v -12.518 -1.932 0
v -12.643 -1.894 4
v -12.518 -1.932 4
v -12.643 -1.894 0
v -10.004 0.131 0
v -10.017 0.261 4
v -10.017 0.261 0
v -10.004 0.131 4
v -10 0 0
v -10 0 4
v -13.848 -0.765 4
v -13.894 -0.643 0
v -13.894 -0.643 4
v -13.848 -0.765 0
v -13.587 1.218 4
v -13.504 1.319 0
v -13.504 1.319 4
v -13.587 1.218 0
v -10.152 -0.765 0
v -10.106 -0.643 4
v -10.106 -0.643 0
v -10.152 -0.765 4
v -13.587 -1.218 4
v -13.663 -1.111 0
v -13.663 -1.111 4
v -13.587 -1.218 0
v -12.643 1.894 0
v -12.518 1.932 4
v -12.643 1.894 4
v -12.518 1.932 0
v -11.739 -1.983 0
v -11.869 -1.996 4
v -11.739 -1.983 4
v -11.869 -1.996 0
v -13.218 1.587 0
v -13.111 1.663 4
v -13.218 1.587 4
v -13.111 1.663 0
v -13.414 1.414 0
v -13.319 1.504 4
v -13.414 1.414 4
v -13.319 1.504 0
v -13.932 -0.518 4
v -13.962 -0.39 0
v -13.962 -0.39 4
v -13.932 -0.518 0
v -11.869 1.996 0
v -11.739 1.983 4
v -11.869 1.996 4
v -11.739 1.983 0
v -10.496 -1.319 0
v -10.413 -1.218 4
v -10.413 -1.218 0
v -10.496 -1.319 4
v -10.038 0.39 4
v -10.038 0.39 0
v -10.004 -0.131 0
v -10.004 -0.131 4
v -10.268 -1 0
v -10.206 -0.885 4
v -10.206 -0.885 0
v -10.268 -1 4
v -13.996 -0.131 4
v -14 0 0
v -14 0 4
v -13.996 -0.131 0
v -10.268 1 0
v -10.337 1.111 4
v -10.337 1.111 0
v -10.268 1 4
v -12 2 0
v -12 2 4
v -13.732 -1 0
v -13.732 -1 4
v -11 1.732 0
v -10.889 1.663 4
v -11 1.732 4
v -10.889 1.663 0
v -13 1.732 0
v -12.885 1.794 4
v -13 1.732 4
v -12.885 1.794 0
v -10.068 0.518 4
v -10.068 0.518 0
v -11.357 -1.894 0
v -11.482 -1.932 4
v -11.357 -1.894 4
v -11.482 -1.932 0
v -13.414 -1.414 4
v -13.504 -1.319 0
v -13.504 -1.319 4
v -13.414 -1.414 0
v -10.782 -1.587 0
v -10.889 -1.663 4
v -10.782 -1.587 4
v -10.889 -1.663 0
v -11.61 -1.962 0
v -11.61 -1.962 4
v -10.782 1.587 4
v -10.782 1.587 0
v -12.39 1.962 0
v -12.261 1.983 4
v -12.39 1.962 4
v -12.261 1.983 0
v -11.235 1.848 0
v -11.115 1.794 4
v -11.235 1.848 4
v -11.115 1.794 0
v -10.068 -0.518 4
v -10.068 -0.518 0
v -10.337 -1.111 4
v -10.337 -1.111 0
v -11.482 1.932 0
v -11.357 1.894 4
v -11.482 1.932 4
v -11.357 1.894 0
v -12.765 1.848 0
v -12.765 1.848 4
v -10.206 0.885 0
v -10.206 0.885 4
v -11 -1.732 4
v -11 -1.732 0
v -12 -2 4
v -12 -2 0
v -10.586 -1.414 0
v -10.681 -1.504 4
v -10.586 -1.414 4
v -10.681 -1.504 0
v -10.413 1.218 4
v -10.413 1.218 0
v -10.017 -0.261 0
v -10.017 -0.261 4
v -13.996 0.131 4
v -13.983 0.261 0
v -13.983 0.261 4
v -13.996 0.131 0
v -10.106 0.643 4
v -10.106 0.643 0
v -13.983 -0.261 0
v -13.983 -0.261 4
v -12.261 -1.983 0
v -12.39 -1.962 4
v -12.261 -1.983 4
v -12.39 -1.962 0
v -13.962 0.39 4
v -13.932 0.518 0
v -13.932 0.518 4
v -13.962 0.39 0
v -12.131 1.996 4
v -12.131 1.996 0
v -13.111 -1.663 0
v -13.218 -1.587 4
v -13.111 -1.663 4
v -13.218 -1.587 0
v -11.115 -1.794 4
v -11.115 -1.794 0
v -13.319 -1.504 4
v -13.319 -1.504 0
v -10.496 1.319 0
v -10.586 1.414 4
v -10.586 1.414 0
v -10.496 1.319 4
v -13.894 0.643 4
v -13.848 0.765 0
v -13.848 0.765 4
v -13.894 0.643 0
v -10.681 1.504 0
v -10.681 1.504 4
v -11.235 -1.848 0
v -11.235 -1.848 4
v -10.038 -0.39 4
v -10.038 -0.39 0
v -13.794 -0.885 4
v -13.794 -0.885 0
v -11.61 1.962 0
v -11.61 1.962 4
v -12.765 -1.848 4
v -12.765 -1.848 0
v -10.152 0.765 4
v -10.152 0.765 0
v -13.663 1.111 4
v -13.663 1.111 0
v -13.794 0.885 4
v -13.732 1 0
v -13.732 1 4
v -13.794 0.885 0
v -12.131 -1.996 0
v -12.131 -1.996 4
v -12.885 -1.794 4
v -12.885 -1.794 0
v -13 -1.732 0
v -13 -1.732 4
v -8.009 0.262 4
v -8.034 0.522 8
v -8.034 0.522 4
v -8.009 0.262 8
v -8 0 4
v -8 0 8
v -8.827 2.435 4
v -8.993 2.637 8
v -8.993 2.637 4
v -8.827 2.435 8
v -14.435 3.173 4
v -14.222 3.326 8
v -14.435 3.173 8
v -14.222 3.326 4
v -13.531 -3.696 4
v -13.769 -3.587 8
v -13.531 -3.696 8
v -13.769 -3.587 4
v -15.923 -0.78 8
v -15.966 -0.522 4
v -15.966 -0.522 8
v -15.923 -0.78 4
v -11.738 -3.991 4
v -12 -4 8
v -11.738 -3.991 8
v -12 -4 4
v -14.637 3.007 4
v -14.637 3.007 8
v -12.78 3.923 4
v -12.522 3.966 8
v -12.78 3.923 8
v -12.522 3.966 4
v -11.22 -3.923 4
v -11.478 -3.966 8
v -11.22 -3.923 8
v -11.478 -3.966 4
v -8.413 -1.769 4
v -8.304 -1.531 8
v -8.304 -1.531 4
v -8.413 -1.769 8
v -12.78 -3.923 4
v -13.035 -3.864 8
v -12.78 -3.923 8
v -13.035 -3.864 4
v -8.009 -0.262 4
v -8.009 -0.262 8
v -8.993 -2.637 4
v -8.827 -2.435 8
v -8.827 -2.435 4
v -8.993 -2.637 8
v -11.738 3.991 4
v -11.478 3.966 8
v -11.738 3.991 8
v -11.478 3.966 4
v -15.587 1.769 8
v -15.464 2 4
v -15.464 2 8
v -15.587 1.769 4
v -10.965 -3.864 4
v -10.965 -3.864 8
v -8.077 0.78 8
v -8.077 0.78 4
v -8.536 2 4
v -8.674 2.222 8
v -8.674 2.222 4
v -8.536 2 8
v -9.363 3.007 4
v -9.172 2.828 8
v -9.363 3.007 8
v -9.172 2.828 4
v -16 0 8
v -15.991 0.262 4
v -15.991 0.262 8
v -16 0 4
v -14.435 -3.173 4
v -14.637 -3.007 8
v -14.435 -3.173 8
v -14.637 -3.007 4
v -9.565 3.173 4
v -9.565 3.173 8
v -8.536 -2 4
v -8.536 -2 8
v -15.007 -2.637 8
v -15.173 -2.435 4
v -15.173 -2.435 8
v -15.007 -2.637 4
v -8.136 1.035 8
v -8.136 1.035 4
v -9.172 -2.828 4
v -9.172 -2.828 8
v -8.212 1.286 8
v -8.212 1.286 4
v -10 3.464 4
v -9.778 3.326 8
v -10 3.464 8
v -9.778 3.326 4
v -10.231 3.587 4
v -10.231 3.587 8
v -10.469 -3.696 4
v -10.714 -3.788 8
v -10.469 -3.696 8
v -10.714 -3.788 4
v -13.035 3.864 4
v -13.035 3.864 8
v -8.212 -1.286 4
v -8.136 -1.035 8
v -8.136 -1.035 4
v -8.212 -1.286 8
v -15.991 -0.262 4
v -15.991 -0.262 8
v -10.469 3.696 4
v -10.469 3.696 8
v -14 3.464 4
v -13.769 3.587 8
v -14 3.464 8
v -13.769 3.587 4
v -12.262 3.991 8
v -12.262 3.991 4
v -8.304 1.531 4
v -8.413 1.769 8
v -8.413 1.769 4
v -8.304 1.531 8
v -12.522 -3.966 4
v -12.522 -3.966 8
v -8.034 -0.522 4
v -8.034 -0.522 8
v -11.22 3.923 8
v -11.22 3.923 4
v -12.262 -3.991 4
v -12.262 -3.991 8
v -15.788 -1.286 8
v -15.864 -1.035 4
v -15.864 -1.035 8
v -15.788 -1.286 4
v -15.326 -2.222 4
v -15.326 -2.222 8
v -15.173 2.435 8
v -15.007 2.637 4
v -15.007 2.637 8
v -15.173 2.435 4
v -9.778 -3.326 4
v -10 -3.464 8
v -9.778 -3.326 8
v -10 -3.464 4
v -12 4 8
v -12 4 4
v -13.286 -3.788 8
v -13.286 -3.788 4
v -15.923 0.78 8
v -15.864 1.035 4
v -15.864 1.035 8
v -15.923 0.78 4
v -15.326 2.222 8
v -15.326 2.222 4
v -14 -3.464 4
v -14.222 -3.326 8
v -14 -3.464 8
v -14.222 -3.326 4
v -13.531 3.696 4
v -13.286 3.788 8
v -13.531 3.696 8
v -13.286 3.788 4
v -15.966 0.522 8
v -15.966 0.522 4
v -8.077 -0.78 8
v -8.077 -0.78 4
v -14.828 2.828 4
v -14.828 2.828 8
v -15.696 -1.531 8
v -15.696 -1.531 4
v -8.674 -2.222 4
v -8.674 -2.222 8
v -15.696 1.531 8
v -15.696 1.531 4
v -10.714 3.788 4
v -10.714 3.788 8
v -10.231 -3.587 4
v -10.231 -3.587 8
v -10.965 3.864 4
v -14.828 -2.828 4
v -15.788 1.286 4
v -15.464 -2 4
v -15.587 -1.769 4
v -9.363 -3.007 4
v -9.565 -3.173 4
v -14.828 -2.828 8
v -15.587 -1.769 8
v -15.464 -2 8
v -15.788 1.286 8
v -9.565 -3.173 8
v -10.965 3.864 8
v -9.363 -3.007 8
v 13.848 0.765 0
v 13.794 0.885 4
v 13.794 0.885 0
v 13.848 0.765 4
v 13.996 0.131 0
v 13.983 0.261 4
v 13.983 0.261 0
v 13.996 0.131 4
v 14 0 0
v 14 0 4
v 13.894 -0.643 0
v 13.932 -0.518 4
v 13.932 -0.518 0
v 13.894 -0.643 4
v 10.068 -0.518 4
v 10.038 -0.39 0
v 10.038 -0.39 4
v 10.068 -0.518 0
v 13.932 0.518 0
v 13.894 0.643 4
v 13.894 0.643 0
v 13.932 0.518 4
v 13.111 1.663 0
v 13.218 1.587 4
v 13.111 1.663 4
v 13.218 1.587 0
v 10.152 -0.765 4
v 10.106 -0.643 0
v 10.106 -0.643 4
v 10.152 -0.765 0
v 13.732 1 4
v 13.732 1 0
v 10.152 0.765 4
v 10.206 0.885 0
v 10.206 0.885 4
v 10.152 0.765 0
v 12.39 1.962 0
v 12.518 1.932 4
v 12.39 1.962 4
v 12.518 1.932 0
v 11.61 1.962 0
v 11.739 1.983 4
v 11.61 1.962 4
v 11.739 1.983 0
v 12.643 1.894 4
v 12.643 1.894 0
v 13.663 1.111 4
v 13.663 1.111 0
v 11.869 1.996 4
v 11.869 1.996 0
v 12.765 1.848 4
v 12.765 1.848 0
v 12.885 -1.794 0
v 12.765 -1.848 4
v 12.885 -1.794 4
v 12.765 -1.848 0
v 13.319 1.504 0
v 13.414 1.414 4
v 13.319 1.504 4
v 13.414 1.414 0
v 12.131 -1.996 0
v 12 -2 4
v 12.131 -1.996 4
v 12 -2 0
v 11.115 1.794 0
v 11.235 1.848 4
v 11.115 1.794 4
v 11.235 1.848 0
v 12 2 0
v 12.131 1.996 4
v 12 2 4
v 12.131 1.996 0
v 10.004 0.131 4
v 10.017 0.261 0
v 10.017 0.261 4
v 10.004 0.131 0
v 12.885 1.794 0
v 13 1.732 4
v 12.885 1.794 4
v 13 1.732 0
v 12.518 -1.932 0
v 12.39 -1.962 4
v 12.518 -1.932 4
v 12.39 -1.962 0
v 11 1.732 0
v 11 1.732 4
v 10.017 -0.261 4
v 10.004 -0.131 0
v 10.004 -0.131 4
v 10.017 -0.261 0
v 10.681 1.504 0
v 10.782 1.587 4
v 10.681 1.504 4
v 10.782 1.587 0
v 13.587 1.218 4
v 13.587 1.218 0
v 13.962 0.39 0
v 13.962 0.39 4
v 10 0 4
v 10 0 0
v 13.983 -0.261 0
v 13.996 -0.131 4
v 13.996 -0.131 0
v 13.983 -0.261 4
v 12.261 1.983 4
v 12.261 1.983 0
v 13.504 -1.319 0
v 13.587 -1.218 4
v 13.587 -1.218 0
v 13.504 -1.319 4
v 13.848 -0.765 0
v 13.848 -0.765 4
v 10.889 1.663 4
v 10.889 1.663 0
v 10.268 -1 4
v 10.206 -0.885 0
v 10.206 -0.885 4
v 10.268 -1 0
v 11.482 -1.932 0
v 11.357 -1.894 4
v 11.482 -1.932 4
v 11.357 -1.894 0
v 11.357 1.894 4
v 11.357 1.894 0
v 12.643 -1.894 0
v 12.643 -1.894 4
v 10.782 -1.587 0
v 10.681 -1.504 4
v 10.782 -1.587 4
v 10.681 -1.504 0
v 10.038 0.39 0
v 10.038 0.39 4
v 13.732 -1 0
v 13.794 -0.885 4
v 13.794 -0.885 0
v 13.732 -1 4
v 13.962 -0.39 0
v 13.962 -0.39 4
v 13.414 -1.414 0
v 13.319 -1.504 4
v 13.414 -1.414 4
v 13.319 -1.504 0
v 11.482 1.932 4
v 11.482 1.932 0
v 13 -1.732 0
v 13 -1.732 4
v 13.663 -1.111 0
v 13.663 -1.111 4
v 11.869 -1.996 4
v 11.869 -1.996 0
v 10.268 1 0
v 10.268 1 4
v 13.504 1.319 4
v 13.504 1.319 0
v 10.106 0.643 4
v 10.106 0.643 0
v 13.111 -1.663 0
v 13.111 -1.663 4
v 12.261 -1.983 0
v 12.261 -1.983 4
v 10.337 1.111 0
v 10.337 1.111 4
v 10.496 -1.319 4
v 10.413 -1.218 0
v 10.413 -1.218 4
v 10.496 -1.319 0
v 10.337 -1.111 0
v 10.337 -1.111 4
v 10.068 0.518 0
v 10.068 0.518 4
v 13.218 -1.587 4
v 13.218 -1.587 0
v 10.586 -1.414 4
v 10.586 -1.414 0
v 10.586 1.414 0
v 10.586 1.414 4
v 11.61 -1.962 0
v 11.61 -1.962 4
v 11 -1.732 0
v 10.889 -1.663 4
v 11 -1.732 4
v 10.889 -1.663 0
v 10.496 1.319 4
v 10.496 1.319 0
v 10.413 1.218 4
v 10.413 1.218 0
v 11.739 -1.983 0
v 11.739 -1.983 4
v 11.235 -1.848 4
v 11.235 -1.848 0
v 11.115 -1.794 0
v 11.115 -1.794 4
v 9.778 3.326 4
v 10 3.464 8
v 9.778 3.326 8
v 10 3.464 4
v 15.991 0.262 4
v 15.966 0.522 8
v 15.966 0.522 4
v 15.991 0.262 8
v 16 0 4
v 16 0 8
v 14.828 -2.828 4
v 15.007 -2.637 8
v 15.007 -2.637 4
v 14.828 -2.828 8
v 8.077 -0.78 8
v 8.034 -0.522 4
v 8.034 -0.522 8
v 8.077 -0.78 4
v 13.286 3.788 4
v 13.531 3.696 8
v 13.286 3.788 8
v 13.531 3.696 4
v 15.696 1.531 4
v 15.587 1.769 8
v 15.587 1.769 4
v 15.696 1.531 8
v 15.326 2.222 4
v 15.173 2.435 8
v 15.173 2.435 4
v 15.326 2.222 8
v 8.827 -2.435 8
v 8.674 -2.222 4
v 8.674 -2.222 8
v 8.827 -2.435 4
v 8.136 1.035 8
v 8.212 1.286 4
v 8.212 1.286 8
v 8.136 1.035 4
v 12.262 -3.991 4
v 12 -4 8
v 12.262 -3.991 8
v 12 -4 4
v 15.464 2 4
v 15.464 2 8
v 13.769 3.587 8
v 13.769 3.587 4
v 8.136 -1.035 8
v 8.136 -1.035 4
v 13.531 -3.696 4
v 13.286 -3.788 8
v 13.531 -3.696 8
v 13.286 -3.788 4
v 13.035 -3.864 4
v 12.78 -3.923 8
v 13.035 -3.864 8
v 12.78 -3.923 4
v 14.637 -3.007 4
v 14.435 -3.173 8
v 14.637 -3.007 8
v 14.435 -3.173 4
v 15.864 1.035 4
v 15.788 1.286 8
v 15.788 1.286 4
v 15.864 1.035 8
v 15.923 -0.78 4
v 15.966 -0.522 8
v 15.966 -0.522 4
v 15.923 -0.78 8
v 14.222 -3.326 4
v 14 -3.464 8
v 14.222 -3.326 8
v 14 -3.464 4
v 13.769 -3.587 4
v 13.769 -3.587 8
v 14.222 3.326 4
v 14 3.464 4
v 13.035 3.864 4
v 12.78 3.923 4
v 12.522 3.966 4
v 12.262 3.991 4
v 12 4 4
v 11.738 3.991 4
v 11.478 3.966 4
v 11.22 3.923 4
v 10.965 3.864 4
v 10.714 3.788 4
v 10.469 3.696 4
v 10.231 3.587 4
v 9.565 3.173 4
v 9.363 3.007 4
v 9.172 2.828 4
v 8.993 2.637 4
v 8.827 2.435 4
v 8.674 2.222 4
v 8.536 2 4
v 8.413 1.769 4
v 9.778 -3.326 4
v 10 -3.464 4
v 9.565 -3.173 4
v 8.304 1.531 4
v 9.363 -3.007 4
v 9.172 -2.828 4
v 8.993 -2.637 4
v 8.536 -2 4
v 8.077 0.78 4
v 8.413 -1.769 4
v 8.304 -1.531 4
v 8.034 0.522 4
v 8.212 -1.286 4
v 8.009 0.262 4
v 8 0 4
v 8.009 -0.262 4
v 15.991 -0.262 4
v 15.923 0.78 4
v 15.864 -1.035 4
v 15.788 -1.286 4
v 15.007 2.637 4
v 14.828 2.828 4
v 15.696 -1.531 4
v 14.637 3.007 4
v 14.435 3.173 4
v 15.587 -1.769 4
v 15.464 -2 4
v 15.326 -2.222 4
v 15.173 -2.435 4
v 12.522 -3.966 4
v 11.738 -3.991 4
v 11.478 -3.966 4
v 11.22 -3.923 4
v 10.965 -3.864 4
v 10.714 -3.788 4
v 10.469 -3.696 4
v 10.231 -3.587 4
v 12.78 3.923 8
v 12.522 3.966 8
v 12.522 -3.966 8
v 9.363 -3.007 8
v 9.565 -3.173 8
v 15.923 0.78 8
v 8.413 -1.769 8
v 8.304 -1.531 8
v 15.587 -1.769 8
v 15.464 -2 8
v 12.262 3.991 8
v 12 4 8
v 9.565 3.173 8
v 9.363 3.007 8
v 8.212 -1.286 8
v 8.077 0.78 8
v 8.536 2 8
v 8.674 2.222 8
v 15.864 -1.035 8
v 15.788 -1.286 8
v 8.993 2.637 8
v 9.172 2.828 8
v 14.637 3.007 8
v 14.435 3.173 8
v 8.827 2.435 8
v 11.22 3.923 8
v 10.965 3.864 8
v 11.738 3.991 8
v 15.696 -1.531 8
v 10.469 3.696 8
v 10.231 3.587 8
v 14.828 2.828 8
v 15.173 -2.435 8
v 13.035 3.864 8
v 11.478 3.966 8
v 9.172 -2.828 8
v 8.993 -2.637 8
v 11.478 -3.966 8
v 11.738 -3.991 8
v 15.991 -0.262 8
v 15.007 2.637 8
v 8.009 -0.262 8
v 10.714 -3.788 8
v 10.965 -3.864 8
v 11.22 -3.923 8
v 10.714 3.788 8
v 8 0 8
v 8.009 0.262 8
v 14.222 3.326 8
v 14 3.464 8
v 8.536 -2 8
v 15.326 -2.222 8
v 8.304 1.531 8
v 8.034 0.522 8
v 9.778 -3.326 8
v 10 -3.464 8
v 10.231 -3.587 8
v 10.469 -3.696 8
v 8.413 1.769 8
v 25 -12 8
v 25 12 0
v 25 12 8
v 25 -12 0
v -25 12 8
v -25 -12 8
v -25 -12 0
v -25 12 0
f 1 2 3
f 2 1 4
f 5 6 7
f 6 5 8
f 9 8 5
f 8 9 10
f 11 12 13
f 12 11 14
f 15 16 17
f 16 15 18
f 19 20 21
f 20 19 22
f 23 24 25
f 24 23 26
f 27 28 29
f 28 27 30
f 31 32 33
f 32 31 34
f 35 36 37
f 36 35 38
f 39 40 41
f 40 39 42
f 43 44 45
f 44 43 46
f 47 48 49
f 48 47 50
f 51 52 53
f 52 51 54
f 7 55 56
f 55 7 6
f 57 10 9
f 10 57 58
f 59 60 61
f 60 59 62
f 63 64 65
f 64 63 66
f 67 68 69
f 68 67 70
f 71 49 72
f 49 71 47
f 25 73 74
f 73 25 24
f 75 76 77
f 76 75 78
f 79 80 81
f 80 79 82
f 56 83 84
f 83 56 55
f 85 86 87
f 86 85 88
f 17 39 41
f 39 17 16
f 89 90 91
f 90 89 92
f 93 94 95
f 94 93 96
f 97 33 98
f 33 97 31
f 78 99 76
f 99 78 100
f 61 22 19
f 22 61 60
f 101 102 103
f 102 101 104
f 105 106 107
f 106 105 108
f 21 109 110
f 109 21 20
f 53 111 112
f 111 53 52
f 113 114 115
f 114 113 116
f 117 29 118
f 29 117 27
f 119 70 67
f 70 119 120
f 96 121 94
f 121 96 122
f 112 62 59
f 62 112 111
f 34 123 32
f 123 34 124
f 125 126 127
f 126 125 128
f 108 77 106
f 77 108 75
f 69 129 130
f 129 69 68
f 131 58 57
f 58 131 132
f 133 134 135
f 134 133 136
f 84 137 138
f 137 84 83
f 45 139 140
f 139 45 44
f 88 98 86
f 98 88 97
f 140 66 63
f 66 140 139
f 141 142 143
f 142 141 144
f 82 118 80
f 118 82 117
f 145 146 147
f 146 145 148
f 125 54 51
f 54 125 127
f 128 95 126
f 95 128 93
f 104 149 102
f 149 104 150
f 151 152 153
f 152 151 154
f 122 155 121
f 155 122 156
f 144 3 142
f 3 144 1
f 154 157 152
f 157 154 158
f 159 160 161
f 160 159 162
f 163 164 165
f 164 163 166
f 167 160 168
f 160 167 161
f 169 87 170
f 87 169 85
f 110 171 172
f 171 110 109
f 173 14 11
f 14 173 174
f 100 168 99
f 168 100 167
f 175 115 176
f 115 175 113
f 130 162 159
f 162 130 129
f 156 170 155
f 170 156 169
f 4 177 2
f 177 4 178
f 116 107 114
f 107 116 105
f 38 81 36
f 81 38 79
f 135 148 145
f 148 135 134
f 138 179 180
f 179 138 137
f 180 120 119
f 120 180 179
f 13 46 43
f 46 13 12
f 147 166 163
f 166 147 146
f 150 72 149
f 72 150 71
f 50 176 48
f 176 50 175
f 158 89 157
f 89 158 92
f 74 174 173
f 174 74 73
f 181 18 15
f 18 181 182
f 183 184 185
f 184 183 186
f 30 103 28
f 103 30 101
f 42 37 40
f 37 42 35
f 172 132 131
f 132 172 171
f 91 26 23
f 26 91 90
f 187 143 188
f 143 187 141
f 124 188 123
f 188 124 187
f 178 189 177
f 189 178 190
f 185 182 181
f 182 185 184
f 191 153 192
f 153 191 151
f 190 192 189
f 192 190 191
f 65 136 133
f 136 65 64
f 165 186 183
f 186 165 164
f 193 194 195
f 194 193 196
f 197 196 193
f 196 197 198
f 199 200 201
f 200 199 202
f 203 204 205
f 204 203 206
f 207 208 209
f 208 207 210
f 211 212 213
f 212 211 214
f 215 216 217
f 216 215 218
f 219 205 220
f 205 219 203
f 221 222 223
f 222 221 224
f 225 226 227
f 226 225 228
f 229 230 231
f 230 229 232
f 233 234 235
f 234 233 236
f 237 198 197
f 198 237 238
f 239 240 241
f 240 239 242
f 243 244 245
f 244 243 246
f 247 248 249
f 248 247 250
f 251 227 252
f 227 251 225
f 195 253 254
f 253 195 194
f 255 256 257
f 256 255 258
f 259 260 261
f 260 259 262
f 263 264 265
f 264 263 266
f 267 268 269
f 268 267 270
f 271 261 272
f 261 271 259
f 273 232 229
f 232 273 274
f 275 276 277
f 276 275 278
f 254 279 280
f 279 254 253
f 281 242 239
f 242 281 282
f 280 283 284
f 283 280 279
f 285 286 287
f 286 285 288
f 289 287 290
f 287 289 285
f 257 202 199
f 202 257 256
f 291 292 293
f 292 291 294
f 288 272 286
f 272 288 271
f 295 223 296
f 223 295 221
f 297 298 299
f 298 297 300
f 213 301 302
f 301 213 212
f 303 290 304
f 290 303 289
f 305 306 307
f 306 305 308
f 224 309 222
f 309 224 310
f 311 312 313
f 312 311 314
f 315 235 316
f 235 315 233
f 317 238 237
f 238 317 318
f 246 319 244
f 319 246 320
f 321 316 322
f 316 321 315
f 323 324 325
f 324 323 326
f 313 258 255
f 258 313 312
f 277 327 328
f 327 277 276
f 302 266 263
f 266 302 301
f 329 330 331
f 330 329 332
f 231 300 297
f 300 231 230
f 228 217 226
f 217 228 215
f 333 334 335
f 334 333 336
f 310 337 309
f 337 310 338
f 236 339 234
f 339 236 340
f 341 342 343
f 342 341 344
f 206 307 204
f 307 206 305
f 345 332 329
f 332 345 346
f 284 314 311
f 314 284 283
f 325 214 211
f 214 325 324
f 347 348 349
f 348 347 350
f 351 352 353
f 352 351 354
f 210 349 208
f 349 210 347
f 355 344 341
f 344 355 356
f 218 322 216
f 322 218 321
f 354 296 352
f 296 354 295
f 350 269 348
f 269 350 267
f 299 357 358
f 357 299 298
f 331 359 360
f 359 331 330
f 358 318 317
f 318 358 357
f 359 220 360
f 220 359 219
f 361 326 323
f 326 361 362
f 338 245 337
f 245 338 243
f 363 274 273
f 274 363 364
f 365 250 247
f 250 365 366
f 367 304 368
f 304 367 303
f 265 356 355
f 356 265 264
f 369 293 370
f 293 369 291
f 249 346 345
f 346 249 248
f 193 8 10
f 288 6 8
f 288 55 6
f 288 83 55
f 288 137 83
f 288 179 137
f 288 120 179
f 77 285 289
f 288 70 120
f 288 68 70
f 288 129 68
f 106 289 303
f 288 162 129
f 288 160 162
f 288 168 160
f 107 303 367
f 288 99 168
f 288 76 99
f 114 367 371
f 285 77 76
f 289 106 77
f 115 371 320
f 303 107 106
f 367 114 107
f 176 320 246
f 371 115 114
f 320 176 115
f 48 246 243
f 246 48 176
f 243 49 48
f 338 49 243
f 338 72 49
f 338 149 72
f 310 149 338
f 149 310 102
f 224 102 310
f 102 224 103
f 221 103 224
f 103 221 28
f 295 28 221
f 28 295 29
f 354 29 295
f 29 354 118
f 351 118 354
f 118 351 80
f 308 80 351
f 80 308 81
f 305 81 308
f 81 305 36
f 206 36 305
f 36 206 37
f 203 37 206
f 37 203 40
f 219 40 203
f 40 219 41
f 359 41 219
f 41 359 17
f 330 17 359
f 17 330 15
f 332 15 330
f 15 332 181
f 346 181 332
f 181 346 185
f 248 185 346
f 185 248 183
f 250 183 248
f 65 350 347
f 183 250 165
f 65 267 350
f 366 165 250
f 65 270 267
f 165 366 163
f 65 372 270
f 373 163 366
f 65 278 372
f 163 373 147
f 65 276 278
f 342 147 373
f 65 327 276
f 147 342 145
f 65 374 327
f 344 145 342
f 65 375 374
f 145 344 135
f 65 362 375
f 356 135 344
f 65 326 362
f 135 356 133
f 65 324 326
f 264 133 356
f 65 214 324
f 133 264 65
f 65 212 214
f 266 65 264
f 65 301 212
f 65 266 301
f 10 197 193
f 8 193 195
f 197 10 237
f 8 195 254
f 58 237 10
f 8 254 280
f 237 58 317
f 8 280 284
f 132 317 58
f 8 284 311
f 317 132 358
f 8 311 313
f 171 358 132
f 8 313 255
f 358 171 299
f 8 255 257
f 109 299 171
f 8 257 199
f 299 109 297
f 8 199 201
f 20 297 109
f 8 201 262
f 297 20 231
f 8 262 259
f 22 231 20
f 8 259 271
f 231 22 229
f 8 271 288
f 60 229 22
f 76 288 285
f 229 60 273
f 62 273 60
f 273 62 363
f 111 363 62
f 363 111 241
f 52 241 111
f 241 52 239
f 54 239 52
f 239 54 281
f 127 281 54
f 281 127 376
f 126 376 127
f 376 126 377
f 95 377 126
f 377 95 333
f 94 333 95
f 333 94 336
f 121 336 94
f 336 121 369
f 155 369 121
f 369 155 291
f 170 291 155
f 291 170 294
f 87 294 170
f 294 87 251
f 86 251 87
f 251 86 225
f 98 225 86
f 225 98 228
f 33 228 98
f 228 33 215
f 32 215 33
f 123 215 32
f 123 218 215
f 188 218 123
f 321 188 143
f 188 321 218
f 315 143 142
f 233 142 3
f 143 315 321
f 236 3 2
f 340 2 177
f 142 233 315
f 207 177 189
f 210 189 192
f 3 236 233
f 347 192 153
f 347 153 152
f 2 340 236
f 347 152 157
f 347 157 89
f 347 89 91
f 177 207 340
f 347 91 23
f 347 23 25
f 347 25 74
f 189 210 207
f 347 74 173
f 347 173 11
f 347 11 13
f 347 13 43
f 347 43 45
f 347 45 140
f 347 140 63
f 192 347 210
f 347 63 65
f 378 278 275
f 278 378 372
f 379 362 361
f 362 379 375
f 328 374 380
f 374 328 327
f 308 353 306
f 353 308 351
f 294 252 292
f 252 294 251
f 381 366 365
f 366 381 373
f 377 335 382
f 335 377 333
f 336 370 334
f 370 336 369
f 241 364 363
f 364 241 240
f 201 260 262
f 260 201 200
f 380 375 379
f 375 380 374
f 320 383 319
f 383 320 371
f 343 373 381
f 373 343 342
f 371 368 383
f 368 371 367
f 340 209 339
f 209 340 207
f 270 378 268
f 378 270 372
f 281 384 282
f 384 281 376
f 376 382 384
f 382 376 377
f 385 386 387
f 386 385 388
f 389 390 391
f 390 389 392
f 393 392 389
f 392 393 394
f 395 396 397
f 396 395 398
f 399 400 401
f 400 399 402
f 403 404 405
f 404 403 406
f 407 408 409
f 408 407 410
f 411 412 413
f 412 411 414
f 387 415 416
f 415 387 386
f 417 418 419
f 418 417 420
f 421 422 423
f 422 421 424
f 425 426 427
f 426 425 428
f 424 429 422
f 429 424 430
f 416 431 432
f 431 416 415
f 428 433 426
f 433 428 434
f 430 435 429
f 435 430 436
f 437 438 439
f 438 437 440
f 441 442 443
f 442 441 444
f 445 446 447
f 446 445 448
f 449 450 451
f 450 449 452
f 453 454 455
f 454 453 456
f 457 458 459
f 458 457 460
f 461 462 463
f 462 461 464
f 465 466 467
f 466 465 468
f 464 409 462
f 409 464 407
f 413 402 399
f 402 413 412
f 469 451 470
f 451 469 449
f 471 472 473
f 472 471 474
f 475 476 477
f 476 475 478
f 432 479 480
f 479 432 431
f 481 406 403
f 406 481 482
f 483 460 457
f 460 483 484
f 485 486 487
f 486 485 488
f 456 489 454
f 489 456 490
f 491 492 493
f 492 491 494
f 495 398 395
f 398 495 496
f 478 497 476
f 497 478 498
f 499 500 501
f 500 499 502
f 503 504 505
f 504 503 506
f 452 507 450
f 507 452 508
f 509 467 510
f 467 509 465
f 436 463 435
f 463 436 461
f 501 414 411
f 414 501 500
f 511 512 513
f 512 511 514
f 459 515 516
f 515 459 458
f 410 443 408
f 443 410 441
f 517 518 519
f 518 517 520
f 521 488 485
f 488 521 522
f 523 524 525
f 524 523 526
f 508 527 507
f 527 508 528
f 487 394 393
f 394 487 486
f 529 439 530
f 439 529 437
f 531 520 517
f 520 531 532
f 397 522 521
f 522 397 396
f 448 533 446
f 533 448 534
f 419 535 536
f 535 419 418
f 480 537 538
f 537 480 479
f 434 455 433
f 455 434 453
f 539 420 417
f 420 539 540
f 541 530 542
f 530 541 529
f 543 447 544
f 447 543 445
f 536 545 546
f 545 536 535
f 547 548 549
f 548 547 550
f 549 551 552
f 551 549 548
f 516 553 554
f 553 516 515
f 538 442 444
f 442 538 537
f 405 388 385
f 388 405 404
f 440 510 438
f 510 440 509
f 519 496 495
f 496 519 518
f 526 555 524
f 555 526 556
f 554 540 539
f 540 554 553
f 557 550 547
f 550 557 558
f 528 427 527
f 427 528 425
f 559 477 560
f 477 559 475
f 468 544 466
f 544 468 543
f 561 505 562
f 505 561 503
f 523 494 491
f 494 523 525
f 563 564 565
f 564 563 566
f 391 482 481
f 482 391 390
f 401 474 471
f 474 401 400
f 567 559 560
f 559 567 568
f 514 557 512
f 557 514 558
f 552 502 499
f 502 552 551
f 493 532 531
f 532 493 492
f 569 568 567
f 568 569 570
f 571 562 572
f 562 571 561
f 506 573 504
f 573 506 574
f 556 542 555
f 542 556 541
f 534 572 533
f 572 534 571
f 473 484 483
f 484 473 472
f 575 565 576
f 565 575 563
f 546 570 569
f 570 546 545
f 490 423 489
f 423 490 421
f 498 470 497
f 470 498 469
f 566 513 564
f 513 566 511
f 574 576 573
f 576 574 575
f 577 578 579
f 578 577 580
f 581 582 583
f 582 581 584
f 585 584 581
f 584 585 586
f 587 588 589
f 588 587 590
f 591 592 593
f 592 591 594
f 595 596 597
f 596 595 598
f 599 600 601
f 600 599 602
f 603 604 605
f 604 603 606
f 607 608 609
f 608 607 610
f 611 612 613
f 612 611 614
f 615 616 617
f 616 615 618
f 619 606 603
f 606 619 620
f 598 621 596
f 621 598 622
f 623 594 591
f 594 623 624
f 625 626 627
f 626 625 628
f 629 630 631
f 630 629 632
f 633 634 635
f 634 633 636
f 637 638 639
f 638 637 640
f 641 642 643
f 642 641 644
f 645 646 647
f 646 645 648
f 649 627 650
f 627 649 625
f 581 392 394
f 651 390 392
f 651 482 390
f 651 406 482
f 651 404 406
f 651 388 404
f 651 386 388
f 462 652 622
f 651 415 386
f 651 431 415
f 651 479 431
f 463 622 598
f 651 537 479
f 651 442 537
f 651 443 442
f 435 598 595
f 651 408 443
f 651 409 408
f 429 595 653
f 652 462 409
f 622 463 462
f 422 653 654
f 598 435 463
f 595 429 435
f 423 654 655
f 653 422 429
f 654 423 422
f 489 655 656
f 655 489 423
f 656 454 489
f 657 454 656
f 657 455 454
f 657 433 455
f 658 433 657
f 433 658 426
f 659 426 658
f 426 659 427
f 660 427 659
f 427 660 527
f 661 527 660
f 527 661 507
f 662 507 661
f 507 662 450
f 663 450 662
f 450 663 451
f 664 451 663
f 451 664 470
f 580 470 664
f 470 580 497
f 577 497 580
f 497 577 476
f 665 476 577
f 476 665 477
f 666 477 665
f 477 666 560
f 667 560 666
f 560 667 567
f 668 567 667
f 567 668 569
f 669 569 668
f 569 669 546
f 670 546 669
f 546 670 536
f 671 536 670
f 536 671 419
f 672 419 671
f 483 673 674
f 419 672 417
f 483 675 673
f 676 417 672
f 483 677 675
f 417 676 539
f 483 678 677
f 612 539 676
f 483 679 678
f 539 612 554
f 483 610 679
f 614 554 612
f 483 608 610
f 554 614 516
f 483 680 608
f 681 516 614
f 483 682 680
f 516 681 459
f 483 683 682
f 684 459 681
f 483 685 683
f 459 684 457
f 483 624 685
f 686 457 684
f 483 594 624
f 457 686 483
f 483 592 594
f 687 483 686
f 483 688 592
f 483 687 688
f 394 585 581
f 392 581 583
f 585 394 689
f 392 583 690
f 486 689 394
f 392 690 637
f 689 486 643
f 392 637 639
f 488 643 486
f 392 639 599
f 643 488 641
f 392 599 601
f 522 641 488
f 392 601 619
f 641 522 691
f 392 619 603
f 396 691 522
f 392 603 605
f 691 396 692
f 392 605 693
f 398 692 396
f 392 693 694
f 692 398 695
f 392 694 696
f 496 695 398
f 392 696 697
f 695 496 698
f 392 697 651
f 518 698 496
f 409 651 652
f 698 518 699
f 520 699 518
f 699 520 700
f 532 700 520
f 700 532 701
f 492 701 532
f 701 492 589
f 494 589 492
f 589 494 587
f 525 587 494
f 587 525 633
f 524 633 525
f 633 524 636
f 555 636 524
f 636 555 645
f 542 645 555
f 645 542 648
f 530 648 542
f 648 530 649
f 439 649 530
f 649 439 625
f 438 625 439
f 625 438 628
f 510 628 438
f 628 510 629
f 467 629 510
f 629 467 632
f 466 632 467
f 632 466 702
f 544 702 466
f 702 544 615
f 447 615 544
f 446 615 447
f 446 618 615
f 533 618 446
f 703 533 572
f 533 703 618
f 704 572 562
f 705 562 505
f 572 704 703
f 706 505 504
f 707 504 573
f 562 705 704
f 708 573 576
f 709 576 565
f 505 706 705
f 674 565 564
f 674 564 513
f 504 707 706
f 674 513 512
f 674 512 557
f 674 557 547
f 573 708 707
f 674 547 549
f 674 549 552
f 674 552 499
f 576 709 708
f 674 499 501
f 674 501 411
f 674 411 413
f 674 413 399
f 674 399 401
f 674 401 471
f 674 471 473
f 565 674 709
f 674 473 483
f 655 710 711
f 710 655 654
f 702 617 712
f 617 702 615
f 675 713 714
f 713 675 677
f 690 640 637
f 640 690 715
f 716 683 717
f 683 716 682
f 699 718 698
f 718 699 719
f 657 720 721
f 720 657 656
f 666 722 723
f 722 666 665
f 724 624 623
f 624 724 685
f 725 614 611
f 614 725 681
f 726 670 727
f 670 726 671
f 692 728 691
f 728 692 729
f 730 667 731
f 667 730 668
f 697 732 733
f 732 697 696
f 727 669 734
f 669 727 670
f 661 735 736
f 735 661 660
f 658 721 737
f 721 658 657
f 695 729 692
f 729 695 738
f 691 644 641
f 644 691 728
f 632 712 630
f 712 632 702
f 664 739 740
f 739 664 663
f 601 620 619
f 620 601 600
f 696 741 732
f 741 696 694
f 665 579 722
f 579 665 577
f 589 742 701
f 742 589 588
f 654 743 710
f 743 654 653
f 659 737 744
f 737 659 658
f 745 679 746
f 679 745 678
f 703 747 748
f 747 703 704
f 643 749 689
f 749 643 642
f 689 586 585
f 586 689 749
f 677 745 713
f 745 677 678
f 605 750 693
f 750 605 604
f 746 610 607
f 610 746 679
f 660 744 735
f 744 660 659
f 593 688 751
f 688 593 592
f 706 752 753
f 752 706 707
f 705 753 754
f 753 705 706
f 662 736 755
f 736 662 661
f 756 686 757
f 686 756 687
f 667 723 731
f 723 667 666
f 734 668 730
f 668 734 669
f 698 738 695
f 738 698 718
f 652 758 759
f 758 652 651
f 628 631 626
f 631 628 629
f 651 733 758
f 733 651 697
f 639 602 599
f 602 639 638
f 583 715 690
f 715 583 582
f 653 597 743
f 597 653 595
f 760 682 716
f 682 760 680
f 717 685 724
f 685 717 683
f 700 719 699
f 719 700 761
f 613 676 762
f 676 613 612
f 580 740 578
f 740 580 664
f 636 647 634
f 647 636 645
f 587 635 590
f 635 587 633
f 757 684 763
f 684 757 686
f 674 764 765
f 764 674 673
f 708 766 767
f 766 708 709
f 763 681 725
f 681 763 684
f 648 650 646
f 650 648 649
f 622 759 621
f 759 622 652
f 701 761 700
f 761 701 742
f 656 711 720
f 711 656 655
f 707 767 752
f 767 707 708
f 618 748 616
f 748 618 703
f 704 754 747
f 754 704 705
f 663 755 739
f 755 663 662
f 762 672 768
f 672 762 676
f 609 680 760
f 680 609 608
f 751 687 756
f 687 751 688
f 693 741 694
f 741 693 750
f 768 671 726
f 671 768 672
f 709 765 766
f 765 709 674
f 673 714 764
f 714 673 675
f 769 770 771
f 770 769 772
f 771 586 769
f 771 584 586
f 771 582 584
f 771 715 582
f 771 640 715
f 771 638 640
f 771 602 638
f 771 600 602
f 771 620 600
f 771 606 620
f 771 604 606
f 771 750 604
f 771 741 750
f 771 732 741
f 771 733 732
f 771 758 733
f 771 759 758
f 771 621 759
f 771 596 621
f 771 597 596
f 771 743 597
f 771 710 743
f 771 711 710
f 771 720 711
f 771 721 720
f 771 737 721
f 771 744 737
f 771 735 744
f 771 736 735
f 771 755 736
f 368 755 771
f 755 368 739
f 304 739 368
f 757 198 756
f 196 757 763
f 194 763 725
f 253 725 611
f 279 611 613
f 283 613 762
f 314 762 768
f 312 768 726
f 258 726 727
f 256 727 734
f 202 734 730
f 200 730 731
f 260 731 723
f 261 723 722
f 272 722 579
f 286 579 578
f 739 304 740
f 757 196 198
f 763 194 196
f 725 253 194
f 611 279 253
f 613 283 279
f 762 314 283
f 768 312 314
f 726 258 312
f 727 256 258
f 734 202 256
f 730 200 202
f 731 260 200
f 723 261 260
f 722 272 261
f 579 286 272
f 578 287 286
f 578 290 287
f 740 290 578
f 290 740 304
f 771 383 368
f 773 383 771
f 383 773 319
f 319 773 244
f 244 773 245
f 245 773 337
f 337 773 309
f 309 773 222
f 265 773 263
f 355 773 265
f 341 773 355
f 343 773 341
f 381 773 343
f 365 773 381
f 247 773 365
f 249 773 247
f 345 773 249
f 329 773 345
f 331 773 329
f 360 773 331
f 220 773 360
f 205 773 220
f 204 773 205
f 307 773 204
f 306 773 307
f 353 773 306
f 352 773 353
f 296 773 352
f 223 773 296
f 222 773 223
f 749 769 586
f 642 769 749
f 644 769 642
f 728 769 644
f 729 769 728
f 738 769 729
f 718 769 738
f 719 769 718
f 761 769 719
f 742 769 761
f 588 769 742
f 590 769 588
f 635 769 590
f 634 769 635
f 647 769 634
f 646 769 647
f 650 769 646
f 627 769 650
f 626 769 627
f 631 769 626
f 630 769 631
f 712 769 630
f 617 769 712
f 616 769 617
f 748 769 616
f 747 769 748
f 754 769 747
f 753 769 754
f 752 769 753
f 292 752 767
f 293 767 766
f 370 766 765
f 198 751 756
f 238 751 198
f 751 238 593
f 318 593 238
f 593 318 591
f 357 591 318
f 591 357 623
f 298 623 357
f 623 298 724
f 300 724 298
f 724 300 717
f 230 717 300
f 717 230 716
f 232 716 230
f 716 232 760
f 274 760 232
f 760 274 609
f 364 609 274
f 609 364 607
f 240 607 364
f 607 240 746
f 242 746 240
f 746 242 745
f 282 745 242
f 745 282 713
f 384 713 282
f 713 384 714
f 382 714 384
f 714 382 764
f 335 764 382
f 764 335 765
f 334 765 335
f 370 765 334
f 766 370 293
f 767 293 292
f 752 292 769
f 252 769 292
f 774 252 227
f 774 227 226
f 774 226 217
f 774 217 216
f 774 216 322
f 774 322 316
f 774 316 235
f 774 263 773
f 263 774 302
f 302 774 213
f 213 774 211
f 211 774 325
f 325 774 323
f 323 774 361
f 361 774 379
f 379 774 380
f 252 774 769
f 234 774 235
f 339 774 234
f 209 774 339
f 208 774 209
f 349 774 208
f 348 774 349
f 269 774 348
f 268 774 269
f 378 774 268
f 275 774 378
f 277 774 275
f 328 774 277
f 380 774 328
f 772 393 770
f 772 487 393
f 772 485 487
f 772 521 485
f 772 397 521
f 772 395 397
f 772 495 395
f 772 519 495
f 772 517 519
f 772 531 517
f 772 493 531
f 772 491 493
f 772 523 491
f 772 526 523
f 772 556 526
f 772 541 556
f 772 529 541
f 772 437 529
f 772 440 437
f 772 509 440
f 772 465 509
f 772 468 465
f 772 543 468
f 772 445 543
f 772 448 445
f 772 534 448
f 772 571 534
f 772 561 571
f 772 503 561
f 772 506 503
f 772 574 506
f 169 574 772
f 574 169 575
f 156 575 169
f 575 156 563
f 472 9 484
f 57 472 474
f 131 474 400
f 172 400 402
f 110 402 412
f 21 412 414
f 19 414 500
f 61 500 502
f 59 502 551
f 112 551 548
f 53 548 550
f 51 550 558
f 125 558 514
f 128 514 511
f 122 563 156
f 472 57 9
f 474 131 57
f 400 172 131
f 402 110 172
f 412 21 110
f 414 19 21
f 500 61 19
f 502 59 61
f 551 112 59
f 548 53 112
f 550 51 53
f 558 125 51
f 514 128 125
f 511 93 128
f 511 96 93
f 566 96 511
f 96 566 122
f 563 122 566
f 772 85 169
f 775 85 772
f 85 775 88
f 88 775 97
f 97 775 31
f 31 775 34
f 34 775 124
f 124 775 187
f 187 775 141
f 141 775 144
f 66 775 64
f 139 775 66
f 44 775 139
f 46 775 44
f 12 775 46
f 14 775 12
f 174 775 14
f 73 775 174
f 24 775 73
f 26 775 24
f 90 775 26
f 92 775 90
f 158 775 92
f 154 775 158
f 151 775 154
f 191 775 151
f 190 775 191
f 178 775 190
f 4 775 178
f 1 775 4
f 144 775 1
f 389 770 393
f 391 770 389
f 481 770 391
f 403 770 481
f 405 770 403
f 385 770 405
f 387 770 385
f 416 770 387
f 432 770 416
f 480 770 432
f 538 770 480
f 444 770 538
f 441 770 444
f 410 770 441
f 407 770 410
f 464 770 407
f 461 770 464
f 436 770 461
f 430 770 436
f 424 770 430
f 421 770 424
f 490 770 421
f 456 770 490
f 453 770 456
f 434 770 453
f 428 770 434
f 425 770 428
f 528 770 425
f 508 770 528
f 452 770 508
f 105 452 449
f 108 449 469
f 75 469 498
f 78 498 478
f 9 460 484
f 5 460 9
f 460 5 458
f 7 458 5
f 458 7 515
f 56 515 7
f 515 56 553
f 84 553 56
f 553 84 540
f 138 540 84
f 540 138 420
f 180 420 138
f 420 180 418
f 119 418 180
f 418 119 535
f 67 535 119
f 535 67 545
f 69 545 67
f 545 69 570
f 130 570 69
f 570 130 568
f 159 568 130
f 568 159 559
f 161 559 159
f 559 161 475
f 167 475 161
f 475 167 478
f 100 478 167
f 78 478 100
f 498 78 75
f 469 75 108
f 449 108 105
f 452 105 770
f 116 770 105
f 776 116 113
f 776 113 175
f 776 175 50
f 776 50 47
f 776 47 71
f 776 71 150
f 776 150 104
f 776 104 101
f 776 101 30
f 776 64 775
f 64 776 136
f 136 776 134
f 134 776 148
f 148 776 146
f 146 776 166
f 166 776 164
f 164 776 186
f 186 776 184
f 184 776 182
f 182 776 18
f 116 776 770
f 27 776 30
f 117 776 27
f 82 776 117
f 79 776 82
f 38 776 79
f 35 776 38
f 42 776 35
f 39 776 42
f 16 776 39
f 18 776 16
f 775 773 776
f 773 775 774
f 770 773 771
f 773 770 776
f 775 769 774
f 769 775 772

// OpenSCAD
// Auto-generated from tests/data/feature_fixtures_manifest.json
// fixture: plate_counterbore_pair
// fixture_type: plate
// description: Two side-by-side counterbore holes in a thick plate.
$fn = 96;

plate_size = [50.000000, 24.000000, 8.000000];
plate_origin = [-25.000000, -12.000000, 0.000000];

module through_hole(center, diameter, height) {
  translate(center) cylinder(d=diameter, h=height, center=false);
}

module through_slot(start, end, width, height) {
  hull() {
    through_hole(start, width, height);
    through_hole(end, width, height);
  }
}

module counterbore_hole(center, through_d, bore_d, bore_depth, plate_thickness) {
  translate([center[0], center[1], -0.1])
    cylinder(d=through_d, h=plate_thickness + 0.2, center=false);
  translate([center[0], center[1], plate_thickness - bore_depth])
    cylinder(d=bore_d, h=bore_depth + 0.1, center=false);
}

difference() {
  translate(plate_origin) cube(plate_size);
  counterbore_hole([-12.000000, 0.000000, 0.000000], 4.000000, 8.000000, 4.000000, 8.000000);  // counterbore_0
  counterbore_hole([12.000000, 0.000000, 0.000000], 4.000000, 8.000000, 4.000000, 8.000000);  // counterbore_1
}
